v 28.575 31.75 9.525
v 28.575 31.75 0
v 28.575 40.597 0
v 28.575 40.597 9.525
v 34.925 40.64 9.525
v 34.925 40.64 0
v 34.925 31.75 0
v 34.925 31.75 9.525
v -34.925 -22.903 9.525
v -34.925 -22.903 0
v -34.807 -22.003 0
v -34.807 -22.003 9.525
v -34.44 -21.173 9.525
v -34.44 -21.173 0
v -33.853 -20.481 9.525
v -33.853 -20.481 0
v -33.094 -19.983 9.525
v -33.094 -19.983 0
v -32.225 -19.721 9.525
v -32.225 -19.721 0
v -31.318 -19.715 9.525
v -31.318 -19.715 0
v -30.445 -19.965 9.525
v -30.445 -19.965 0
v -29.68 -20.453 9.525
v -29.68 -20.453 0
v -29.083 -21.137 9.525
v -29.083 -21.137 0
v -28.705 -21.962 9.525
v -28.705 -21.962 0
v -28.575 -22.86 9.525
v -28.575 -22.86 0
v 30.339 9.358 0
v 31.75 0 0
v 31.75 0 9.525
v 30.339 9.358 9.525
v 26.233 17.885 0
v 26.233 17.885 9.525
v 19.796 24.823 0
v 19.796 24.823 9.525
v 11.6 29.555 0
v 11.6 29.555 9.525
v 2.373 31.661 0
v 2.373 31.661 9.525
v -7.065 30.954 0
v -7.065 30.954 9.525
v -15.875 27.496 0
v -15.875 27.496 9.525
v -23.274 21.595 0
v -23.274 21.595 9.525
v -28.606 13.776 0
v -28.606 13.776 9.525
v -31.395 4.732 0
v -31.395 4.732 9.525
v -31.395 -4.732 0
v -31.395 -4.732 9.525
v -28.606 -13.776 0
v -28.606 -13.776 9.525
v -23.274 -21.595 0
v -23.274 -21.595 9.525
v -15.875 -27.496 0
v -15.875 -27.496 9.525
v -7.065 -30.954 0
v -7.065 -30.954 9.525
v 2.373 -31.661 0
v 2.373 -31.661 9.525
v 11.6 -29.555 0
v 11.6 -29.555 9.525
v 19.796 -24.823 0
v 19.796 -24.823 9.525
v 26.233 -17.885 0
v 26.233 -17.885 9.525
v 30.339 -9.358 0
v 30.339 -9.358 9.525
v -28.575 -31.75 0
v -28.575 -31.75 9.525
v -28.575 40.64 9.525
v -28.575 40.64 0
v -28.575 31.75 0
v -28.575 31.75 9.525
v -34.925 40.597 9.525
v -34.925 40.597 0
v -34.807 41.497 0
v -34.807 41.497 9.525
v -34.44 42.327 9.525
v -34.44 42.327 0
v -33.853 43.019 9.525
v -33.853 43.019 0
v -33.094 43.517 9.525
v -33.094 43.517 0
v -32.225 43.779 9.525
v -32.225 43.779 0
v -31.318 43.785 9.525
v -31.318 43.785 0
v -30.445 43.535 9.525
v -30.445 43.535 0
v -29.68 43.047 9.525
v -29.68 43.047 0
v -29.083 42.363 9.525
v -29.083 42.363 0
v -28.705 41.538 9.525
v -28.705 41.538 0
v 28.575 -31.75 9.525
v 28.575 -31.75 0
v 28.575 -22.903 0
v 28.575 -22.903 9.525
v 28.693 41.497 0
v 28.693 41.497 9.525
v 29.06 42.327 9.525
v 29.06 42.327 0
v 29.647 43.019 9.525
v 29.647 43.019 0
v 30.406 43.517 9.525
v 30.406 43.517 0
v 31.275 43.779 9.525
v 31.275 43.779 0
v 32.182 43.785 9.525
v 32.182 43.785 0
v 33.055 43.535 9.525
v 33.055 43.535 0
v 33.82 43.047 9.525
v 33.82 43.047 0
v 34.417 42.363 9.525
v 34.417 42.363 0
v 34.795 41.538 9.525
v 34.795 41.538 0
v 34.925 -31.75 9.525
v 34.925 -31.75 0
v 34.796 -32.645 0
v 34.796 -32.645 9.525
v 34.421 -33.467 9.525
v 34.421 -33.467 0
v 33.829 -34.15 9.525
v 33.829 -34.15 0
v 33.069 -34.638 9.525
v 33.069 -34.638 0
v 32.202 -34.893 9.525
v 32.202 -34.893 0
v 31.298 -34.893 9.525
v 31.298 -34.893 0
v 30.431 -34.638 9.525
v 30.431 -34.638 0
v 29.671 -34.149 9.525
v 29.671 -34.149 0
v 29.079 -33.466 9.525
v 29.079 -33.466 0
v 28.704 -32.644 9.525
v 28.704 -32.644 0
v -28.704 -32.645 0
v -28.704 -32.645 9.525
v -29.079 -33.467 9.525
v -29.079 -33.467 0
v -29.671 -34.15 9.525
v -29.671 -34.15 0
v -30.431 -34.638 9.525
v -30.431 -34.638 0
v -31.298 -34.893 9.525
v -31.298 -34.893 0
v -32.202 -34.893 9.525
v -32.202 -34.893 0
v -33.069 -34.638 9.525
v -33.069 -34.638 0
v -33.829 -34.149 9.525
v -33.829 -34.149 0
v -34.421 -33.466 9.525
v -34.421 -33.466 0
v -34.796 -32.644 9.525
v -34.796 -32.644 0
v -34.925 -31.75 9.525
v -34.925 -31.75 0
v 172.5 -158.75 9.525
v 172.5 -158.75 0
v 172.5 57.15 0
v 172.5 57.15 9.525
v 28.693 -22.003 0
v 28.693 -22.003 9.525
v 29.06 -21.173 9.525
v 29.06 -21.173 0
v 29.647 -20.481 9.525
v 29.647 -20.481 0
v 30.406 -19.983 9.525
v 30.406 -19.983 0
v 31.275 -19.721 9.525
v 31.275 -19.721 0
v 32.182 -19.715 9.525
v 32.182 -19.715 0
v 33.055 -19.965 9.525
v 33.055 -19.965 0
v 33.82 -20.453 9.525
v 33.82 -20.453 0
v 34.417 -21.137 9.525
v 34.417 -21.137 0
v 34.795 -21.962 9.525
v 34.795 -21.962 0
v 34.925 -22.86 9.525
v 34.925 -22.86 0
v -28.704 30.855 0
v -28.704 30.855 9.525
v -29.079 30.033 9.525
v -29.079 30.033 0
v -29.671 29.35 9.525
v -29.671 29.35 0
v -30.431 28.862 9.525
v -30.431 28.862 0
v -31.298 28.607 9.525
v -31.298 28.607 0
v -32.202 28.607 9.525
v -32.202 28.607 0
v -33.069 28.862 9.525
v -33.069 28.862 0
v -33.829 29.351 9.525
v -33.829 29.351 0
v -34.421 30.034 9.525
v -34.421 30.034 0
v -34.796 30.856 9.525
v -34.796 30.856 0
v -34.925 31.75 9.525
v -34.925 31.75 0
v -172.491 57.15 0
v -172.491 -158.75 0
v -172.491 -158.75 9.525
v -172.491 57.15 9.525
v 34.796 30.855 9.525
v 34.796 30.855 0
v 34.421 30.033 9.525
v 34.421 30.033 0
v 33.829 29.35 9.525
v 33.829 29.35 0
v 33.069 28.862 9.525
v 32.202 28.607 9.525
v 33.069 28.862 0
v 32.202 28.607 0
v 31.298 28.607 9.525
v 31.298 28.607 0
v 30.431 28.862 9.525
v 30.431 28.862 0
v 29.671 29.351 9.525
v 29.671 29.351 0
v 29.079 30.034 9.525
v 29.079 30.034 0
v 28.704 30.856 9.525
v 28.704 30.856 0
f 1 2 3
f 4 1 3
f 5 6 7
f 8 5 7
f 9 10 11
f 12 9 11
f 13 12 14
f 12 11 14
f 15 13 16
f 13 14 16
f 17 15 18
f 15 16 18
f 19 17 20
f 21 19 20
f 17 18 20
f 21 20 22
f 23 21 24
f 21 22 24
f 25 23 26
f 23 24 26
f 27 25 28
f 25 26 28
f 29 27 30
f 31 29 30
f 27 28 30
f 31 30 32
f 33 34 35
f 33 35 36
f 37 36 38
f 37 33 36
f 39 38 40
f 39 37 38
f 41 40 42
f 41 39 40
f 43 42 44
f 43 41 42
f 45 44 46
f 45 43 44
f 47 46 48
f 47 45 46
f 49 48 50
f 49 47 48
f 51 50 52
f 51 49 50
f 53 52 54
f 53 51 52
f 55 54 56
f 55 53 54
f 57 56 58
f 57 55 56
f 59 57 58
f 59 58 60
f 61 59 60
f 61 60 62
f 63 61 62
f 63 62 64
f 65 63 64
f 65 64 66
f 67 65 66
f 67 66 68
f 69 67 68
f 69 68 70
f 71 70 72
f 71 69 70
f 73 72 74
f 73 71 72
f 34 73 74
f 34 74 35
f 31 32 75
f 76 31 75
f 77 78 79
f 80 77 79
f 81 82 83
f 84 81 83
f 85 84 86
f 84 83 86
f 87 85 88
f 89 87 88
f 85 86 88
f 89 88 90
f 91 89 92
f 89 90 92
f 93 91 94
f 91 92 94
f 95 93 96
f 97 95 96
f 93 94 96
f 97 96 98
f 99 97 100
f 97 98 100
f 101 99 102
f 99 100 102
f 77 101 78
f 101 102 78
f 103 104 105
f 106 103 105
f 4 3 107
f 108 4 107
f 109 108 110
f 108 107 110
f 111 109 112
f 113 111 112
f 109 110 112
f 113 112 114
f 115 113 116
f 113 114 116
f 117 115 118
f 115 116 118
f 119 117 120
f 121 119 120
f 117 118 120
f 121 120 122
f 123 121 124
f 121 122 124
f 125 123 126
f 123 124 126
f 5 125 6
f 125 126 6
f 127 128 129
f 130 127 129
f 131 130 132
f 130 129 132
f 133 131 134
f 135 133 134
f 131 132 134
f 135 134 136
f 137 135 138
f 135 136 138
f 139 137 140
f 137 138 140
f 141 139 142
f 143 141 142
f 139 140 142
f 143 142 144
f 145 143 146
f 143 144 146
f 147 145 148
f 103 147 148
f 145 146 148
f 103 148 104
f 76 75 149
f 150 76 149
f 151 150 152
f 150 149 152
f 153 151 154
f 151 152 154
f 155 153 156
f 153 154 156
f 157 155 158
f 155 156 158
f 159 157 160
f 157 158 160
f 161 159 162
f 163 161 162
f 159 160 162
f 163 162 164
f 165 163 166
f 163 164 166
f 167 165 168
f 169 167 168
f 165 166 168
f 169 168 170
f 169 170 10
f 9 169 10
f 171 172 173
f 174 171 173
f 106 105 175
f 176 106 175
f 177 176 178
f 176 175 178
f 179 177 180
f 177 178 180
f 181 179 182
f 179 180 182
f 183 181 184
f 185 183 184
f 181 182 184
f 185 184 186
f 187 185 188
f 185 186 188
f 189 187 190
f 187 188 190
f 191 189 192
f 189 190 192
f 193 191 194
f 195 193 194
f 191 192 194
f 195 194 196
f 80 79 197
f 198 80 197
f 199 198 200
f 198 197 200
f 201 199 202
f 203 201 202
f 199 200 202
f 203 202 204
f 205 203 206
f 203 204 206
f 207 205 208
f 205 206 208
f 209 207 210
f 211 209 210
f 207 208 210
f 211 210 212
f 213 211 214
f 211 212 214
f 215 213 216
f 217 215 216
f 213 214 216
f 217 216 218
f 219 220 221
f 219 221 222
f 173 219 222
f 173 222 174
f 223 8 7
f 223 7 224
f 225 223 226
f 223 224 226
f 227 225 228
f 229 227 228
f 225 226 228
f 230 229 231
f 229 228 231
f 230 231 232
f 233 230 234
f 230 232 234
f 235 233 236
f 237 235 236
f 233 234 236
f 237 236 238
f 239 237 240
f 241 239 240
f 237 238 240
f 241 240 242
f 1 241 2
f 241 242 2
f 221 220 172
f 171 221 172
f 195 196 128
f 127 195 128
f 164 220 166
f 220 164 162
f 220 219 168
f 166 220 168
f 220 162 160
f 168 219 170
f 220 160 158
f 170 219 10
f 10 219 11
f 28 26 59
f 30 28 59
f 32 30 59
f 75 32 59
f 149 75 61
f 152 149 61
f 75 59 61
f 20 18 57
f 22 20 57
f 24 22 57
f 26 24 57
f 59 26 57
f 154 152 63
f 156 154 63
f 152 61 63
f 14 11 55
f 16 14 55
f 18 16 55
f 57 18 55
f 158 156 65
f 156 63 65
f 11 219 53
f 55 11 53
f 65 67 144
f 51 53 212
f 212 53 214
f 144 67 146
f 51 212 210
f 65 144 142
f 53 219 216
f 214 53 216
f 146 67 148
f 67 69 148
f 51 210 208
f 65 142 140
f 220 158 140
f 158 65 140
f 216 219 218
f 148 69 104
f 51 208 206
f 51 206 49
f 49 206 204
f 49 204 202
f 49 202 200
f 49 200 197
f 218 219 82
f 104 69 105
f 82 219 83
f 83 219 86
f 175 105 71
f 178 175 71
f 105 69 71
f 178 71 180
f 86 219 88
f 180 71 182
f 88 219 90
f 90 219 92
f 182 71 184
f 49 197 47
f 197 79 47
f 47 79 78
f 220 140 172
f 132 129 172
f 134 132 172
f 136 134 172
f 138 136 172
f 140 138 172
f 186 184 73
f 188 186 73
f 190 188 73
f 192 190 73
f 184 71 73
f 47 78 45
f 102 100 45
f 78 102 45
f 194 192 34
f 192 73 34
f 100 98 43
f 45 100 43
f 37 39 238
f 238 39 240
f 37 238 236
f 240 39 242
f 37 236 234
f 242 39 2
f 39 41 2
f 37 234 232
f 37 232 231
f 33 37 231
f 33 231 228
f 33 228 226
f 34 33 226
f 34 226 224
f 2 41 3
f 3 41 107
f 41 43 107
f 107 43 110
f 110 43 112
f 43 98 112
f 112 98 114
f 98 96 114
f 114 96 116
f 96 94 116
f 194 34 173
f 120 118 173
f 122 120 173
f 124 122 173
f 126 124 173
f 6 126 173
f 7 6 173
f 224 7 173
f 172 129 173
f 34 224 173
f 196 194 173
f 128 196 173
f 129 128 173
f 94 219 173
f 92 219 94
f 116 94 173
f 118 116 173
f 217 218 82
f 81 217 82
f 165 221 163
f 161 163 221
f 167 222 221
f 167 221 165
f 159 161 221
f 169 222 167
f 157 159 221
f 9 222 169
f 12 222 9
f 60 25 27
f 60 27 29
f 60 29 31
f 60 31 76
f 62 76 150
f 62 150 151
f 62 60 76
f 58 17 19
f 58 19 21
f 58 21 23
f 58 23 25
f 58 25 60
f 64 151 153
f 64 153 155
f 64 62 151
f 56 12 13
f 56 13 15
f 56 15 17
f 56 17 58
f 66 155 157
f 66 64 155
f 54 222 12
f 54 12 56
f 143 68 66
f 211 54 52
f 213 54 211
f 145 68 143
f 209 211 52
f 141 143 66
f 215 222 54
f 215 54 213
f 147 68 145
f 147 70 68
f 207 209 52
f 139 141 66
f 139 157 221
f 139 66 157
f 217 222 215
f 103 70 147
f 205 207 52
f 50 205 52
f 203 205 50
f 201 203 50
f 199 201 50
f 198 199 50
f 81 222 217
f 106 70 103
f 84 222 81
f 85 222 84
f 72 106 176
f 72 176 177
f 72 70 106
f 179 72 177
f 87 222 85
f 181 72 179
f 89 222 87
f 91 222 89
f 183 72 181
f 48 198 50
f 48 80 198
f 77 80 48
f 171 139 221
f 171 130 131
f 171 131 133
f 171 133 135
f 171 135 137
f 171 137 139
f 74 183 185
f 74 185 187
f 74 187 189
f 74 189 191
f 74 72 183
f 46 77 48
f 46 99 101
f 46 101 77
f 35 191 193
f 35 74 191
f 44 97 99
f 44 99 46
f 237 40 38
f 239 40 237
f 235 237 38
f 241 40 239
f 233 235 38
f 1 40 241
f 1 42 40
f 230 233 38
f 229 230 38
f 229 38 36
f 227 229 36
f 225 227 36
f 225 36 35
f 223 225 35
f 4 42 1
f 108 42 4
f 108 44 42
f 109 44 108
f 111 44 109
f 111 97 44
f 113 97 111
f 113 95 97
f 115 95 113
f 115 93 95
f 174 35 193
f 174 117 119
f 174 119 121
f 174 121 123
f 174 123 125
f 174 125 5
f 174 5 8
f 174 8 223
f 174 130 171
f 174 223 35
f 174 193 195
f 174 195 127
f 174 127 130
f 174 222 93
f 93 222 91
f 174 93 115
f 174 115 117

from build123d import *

# Parameters (mm, degrees)
F0_W     = 344.9914
F0_H     = 215.9
F0_R     = 31.75
F1_DEPTH = 9.525


# Not quite as in the source:
# - a length typed as a fraction of an inch, garbled in the dataset ("3 / 203.2 mm" for 3/8 in), is restored


with BuildPart() as f1:
    # F0 (on Top) → F1 (new body)
    with BuildSketch(Plane.XY):
        with Locations((0.0043, -50.8)):
            Rectangle(F0_W, F0_H)
        with BuildLine():
            ThreePointArc((-34.9247077073, -22.903081011), (-31.7715410013, -19.685073074), (-28.575, -22.86))
            Line((-28.575, -22.86), (-28.575, -31.75))
            ThreePointArc((-28.575, -31.75), (-31.7500524496, -34.9249999996), (-34.9249999983, -31.7498951008))
            Line((-34.9249999983, -31.7498951008), (-34.9247077073, -22.903081011))
        make_face(mode=Mode.SUBTRACT)
        Circle(F0_R, mode=Mode.SUBTRACT)
        with BuildLine():
            Line((-28.575, 40.64), (-28.575, 31.75))
            ThreePointArc((-28.575, 31.75), (-31.7500524496, 28.5750000004), (-34.9249999983, 31.7501048992))
            Line((-34.9249999983, 31.7501048992), (-34.9247077073, 40.596918989))
            ThreePointArc((-34.9247077073, 40.596918989), (-31.7715410013, 43.814926926), (-28.575, 40.64))
        make_face(mode=Mode.SUBTRACT)
        with BuildLine():
            ThreePointArc((28.5752922927, -22.903081011), (31.7284589987, -19.685073074), (34.925, -22.86))
            Line((34.925, -22.86), (34.925, -31.75))
            ThreePointArc((34.925, -31.75), (31.7499475504, -34.9249999996), (28.5750000017, -31.7498951008))
            Line((28.5750000017, -31.7498951008), (28.5752922927, -22.903081011))
        make_face(mode=Mode.SUBTRACT)
        with BuildLine():
            ThreePointArc((28.5752922927, 40.596918989), (31.7284589987, 43.814926926), (34.925, 40.64))
            Line((34.925, 40.64), (34.925, 31.75))
            ThreePointArc((34.925, 31.75), (31.7499475504, 28.5750000004), (28.5750000017, 31.7501048992))
            Line((28.5750000017, 31.7501048992), (28.5752922927, 40.596918989))
        make_face(mode=Mode.SUBTRACT)
    extrude(amount=F1_DEPTH)


solid = f1.part
